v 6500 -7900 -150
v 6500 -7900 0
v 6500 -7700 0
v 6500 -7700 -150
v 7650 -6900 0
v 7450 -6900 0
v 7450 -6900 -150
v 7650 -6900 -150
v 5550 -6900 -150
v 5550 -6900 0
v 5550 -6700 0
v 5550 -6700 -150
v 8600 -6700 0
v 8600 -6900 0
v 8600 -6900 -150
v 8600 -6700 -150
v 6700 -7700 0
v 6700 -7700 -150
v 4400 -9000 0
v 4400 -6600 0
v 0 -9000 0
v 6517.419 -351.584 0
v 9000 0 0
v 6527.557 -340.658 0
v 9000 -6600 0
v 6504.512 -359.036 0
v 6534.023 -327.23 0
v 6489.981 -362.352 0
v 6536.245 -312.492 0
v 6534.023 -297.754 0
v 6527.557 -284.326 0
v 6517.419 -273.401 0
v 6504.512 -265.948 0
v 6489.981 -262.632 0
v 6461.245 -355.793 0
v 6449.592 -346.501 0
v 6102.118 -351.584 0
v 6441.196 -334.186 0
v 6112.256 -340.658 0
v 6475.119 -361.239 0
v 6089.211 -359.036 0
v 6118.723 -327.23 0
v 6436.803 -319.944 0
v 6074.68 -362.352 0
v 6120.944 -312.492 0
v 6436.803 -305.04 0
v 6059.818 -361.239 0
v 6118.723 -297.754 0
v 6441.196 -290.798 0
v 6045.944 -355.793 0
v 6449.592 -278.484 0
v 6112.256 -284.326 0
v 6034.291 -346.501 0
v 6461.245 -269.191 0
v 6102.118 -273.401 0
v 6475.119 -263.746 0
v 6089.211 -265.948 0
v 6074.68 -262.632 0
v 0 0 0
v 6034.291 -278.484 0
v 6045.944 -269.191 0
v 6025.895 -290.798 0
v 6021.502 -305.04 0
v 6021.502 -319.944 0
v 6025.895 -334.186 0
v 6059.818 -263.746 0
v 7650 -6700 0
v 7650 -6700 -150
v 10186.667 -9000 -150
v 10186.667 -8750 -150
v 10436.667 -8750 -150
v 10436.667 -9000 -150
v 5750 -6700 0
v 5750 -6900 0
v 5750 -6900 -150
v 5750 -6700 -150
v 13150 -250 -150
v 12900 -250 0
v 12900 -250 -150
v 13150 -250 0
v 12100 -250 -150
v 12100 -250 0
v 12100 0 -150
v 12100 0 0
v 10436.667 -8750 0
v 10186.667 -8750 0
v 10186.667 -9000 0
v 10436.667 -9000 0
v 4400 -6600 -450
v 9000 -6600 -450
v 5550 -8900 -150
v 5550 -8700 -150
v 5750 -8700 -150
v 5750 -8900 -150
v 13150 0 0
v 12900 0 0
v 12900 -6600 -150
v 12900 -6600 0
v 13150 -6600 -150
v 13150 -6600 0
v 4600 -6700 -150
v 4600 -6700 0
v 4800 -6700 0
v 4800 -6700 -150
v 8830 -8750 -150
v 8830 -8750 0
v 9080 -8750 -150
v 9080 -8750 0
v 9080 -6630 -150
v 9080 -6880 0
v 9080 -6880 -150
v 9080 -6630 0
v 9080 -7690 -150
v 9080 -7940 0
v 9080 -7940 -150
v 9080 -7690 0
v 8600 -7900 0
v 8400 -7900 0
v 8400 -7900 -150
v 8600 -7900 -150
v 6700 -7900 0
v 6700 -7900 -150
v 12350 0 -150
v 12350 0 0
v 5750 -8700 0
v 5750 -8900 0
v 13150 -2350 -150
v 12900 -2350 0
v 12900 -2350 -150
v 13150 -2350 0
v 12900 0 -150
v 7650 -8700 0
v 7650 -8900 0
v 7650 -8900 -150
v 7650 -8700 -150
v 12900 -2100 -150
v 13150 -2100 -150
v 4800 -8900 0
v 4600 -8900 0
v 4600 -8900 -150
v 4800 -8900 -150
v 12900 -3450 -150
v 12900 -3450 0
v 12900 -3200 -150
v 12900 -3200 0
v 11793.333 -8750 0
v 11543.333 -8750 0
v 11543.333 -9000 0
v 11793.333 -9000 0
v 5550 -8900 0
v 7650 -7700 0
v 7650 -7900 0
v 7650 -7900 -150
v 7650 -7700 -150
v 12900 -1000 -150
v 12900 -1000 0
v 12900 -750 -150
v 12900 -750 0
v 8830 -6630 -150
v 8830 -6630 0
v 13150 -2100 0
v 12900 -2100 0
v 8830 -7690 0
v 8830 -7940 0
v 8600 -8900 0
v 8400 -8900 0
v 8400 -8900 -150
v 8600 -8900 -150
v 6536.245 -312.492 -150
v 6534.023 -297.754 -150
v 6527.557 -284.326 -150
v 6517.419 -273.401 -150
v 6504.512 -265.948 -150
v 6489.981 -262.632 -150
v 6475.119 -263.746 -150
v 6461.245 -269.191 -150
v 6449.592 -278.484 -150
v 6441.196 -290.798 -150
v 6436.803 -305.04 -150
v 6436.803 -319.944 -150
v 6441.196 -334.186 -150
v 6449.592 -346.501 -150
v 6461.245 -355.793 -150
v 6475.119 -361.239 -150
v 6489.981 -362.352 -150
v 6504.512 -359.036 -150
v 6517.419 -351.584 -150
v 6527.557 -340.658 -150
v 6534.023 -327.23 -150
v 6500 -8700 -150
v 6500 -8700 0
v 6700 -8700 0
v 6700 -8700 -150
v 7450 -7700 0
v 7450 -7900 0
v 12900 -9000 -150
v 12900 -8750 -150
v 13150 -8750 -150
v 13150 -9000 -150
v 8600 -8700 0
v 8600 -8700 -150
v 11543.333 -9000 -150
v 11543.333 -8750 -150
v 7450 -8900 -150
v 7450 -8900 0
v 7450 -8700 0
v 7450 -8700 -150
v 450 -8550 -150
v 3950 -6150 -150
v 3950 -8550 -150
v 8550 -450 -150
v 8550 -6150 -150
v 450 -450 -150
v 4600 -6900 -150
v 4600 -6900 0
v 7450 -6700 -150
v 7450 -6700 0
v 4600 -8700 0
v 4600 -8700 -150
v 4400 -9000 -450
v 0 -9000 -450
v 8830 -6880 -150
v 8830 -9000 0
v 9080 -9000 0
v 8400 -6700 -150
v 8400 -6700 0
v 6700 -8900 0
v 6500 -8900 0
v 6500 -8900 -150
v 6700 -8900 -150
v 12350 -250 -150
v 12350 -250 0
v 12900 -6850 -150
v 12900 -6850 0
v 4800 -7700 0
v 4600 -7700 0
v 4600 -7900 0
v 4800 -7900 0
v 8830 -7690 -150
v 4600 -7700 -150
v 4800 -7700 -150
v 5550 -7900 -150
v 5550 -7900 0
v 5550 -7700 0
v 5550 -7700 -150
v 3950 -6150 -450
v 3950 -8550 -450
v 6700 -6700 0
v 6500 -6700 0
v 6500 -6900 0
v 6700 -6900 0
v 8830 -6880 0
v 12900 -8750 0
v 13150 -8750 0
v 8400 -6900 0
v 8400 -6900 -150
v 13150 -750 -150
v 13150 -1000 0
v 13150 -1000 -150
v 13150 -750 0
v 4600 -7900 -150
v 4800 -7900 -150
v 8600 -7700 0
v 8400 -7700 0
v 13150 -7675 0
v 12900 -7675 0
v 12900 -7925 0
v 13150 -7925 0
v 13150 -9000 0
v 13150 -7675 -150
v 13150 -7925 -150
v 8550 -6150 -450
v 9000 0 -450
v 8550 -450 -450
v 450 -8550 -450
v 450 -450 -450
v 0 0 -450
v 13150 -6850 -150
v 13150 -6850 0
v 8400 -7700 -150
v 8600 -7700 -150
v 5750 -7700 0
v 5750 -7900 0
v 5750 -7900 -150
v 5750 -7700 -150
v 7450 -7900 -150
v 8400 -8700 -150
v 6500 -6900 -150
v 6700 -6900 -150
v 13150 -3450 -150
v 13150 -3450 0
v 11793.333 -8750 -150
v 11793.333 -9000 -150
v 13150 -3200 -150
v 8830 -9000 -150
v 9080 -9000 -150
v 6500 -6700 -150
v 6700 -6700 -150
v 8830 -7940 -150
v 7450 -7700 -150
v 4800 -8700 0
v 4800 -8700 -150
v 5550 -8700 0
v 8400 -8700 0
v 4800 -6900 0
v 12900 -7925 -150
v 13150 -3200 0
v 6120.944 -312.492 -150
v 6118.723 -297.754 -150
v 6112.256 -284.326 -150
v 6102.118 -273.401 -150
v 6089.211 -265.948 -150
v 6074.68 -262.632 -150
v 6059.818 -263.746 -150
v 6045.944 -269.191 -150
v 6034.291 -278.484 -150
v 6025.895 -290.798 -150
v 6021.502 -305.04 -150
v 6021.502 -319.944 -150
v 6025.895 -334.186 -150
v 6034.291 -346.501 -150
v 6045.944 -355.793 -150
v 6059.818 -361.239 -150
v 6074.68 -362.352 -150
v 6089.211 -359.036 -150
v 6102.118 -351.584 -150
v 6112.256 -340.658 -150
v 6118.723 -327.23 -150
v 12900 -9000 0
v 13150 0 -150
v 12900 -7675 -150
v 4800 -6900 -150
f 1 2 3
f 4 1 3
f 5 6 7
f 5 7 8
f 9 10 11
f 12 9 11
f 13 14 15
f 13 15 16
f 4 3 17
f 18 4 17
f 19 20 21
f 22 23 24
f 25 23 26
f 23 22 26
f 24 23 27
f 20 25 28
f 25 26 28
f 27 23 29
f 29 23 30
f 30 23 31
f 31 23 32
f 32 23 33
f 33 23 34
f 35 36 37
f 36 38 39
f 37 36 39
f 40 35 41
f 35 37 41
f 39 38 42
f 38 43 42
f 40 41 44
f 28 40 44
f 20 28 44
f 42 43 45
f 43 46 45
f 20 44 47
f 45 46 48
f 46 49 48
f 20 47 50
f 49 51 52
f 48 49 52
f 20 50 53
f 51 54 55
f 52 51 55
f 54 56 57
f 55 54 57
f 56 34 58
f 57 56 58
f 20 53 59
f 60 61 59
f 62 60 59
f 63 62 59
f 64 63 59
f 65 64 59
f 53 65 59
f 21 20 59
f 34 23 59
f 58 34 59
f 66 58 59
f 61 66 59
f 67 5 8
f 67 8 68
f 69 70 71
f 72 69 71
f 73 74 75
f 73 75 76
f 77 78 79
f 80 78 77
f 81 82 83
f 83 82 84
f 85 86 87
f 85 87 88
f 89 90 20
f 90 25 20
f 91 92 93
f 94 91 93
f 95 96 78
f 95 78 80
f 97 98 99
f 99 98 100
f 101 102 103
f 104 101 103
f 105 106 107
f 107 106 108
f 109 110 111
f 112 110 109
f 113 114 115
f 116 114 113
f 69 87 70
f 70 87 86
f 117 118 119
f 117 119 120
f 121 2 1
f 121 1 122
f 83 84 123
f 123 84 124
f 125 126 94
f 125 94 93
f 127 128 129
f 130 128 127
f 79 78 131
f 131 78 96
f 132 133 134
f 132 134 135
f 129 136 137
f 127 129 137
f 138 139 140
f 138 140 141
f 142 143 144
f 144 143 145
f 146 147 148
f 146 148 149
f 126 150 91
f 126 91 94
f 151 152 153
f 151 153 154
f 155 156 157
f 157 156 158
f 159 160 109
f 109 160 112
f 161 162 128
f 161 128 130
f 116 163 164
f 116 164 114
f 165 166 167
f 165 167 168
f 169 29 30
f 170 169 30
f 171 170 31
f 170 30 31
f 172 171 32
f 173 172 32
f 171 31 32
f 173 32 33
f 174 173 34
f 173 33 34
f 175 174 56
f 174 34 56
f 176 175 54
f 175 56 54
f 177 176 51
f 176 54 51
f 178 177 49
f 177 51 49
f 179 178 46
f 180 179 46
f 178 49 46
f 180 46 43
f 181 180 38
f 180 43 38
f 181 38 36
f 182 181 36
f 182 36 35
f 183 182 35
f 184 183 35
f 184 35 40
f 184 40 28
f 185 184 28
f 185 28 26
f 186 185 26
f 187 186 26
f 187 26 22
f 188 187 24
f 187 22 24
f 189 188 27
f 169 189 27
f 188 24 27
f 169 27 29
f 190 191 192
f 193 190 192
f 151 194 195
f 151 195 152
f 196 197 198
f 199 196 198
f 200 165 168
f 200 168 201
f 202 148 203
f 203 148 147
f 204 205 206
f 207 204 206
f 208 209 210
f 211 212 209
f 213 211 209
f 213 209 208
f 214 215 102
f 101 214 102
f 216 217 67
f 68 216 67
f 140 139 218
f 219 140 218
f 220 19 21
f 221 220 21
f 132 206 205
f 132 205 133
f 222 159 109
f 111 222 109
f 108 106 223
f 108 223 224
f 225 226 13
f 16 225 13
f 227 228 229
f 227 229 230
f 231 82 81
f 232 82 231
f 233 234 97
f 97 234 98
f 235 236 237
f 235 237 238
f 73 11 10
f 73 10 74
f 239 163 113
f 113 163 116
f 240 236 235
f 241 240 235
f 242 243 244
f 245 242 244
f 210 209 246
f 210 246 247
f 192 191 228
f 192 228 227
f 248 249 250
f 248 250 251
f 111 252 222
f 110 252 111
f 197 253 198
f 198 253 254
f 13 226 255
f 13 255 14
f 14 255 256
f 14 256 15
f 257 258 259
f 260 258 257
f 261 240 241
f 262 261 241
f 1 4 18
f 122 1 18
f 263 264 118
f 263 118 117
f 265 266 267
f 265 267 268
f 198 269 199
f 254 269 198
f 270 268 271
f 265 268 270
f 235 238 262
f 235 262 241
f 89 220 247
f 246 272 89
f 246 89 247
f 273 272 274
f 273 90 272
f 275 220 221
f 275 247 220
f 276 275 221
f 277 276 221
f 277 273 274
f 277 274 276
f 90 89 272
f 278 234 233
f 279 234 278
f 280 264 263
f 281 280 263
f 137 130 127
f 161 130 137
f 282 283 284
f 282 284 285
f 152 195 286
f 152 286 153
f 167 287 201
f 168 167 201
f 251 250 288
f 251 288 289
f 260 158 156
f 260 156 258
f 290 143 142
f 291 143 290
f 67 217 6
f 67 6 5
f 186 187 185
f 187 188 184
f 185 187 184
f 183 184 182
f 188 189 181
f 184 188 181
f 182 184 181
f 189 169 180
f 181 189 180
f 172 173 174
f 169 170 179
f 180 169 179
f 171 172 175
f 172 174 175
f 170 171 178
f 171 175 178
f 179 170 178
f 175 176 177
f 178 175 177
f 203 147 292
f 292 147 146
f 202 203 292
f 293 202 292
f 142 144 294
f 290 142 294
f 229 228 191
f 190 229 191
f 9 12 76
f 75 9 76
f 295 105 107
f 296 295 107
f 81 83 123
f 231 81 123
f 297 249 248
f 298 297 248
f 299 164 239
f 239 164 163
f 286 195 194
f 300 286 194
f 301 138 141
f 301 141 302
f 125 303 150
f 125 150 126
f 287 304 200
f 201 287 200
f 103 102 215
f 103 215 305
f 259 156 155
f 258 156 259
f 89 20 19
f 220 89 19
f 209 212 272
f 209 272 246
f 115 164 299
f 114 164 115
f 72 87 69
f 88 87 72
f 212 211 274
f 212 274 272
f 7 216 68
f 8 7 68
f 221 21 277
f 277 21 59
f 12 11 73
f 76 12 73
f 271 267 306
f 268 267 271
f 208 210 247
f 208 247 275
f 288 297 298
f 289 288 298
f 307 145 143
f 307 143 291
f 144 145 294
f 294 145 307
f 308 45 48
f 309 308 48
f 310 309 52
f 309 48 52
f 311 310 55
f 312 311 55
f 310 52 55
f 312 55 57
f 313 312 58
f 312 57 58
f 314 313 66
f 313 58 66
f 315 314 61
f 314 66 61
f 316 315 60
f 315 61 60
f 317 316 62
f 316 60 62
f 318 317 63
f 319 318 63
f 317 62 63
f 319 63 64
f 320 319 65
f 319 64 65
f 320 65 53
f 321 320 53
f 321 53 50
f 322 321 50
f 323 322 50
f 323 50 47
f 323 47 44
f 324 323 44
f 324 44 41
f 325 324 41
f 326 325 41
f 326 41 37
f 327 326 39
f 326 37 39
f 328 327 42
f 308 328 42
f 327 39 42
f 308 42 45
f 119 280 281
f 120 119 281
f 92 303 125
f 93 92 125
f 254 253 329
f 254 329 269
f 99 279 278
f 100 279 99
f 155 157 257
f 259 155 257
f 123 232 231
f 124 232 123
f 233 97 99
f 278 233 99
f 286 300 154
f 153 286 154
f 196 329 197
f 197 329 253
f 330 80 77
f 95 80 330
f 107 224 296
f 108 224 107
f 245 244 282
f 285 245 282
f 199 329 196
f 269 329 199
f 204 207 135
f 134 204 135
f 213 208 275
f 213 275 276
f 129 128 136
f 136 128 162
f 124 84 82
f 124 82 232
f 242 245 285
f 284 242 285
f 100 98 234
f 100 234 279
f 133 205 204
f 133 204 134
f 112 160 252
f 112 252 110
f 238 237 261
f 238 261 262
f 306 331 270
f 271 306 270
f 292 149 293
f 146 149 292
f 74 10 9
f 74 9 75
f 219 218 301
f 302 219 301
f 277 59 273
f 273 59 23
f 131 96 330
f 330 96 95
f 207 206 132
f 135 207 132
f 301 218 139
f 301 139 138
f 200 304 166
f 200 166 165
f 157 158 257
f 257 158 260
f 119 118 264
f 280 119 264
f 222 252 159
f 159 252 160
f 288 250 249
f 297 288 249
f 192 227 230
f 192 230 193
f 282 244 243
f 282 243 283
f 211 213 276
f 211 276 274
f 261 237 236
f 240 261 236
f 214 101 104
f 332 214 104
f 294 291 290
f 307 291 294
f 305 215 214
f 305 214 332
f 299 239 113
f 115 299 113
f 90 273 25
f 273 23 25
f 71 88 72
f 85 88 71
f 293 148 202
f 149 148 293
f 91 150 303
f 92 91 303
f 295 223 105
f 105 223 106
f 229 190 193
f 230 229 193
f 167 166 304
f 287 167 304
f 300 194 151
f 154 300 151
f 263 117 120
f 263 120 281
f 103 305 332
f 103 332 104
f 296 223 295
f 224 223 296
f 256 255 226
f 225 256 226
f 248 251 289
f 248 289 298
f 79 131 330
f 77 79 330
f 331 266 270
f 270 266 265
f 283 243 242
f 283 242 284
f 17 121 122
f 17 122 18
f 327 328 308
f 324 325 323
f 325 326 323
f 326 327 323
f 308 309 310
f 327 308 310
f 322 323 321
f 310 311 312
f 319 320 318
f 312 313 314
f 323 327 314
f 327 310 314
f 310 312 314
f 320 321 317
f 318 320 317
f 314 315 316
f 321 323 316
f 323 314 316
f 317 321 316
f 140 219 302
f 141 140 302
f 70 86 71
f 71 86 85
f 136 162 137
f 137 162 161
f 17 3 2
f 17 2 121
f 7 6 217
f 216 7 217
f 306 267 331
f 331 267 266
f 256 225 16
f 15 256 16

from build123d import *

# Parameters (mm, degrees)
SKETCH_1_R         = 50
EXTRUDE_1_DEPTH    = 150
SKETCH_1_W         = 250
SKETCH_1_H         = 250
EXTRUDE_1_2_DEPTH  = 150
EXTRUDE_1_3_DEPTH  = 150
EXTRUDE_1_4_DEPTH  = 150
EXTRUDE_1_5_DEPTH  = 150
EXTRUDE_1_6_DEPTH  = 150
EXTRUDE_1_7_DEPTH  = 150
EXTRUDE_1_8_DEPTH  = 150
EXTRUDE_1_9_DEPTH  = 150
EXTRUDE_1_10_DEPTH = 150
EXTRUDE_1_11_DEPTH = 150
EXTRUDE_1_12_DEPTH = 150
EXTRUDE_1_13_DEPTH = 150
EXTRUDE_1_14_DEPTH = 150
SKETCH_1_W_2       = 200
SKETCH_1_H_2       = 200
EXTRUDE_1_15_DEPTH = 150
EXTRUDE_1_16_DEPTH = 150
EXTRUDE_1_17_DEPTH = 150
EXTRUDE_1_18_DEPTH = 150
EXTRUDE_1_19_DEPTH = 150
EXTRUDE_1_20_DEPTH = 150
EXTRUDE_1_21_DEPTH = 150
EXTRUDE_1_22_DEPTH = 150
EXTRUDE_1_23_DEPTH = 150
EXTRUDE_1_24_DEPTH = 150
EXTRUDE_1_25_DEPTH = 150
EXTRUDE_1_26_DEPTH = 150
EXTRUDE_1_27_DEPTH = 150
EXTRUDE_1_28_DEPTH = 150
EXTRUDE_1_29_DEPTH = 150
EXTRUDE_2_DEPTH    = 300


with BuildPart() as part:
    # Эскиз1 → Бобышка-Вытянуть1 (new body)
    with BuildSketch(Plane.XY):
        Polygon((0, 0), (9000, 0), (9000, -6600), (4400, -6600), (4400, -9000), (0, -9000), align=None)
        with Locations((6486.244831881, -312.492160742)):
            Circle(SKETCH_1_R, mode=Mode.SUBTRACT)
        with Locations((6070.943926101, -312.492160742)):
            Circle(SKETCH_1_R, mode=Mode.SUBTRACT)
    extrude(amount=-EXTRUDE_1_DEPTH)

    # Эскиз2 → Бобышка-Вытянуть2 (add)
    with BuildSketch(Plane(origin=(0, 0, -150), x_dir=(-1, 0, 0), z_dir=(0, 0, -1))):
        Polygon((0, -9000), (0, 0), (-9000, 0), (-9000, -6600), (-4400, -6600), (-4400, -9000), align=None)
        Polygon((-450, -8550), (-450, -450), (-8550, -450), (-8550, -6150), (-3950, -6150), (-3950, -8550), align=None, mode=Mode.SUBTRACT)
    extrude(amount=EXTRUDE_2_DEPTH)


with BuildPart() as body_2:
    # Эскиз1 → Extrude 1 2 (new body)
    with BuildSketch(Plane.XY):
        with Locations((8955, -8875)):
            Rectangle(SKETCH_1_W, SKETCH_1_H)
    extrude(amount=-EXTRUDE_1_2_DEPTH)


with BuildPart() as body_3:
    # Эскиз1 → Extrude 1 3 (new body)
    with BuildSketch(Plane.XY):
        with Locations((8955, -6755)):
            Rectangle(SKETCH_1_W, SKETCH_1_H)
    extrude(amount=-EXTRUDE_1_3_DEPTH)


with BuildPart() as body_4:
    # Эскиз1 → Extrude 1 4 (new body)
    with BuildSketch(Plane.XY):
        with Locations((8955, -7815)):
            Rectangle(SKETCH_1_W, SKETCH_1_H)
    extrude(amount=-EXTRUDE_1_4_DEPTH)


with BuildPart() as body_5:
    # Эскиз1 → Extrude 1 5 (new body)
    with BuildSketch(Plane.XY):
        with Locations((10311.666666667, -8875)):
            Rectangle(SKETCH_1_W, SKETCH_1_H)
    extrude(amount=-EXTRUDE_1_5_DEPTH)


with BuildPart() as body_6:
    # Эскиз1 → Extrude 1 6 (new body)
    with BuildSketch(Plane.XY):
        with Locations((11668.333333333, -8875)):
            Rectangle(SKETCH_1_W, SKETCH_1_H)
    extrude(amount=-EXTRUDE_1_6_DEPTH)


with BuildPart() as body_7:
    # Эскиз1 → Extrude 1 7 (new body)
    with BuildSketch(Plane.XY):
        with Locations((13025, -8875)):
            Rectangle(SKETCH_1_W, SKETCH_1_H)
    extrude(amount=-EXTRUDE_1_7_DEPTH)


with BuildPart() as body_8:
    # Эскиз1 → Extrude 1 8 (new body)
    with BuildSketch(Plane.XY):
        with Locations((13025, -6725)):
            Rectangle(SKETCH_1_W, SKETCH_1_H)
    extrude(amount=-EXTRUDE_1_8_DEPTH)


with BuildPart() as body_9:
    # Эскиз1 → Extrude 1 9 (new body)
    with BuildSketch(Plane.XY):
        with Locations((13025, -7800)):
            Rectangle(SKETCH_1_W, SKETCH_1_H)
    extrude(amount=-EXTRUDE_1_9_DEPTH)


with BuildPart() as body_10:
    # Эскиз1 → Extrude 1 10 (new body)
    with BuildSketch(Plane.XY):
        with Locations((13025, -3325)):
            Rectangle(SKETCH_1_W, SKETCH_1_H)
    extrude(amount=-EXTRUDE_1_10_DEPTH)


with BuildPart() as body_11:
    # Эскиз1 → Extrude 1 11 (new body)
    with BuildSketch(Plane.XY):
        with Locations((13025, -2225)):
            Rectangle(SKETCH_1_W, SKETCH_1_H)
    extrude(amount=-EXTRUDE_1_11_DEPTH)


with BuildPart() as body_12:
    # Эскиз1 → Extrude 1 12 (new body)
    with BuildSketch(Plane.XY):
        with Locations((13025, -875)):
            Rectangle(SKETCH_1_W, SKETCH_1_H)
    extrude(amount=-EXTRUDE_1_12_DEPTH)


with BuildPart() as body_13:
    # Эскиз1 → Extrude 1 13 (new body)
    with BuildSketch(Plane.XY):
        with Locations((13025, -125)):
            Rectangle(SKETCH_1_W, SKETCH_1_H)
    extrude(amount=-EXTRUDE_1_13_DEPTH)


with BuildPart() as body_14:
    # Эскиз1 → Extrude 1 14 (new body)
    with BuildSketch(Plane.XY):
        with Locations((12225, -125)):
            Rectangle(SKETCH_1_W, SKETCH_1_H)
    extrude(amount=-EXTRUDE_1_14_DEPTH)


with BuildPart() as body_15:
    # Эскиз1 → Extrude 1 15 (new body)
    with BuildSketch(Plane.XY):
        with Locations((4700, -6800)):
            Rectangle(SKETCH_1_W_2, SKETCH_1_H_2)
    extrude(amount=-EXTRUDE_1_15_DEPTH)


with BuildPart() as body_16:
    # Эскиз1 → Extrude 1 16 (new body)
    with BuildSketch(Plane.XY):
        with Locations((4700, -7800)):
            Rectangle(SKETCH_1_W_2, SKETCH_1_H_2)
    extrude(amount=-EXTRUDE_1_16_DEPTH)


with BuildPart() as body_17:
    # Эскиз1 → Extrude 1 17 (new body)
    with BuildSketch(Plane.XY):
        with Locations((4700, -8800)):
            Rectangle(SKETCH_1_W_2, SKETCH_1_H_2)
    extrude(amount=-EXTRUDE_1_17_DEPTH)


with BuildPart() as body_18:
    # Эскиз1 → Extrude 1 18 (new body)
    with BuildSketch(Plane.XY):
        with Locations((5650, -6800)):
            Rectangle(SKETCH_1_W_2, SKETCH_1_H_2)
    extrude(amount=-EXTRUDE_1_18_DEPTH)


with BuildPart() as body_19:
    # Эскиз1 → Extrude 1 19 (new body)
    with BuildSketch(Plane.XY):
        with Locations((5650, -7800)):
            Rectangle(SKETCH_1_W_2, SKETCH_1_H_2)
    extrude(amount=-EXTRUDE_1_19_DEPTH)


with BuildPart() as body_20:
    # Эскиз1 → Extrude 1 20 (new body)
    with BuildSketch(Plane.XY):
        with Locations((5650, -8800)):
            Rectangle(SKETCH_1_W_2, SKETCH_1_H_2)
    extrude(amount=-EXTRUDE_1_20_DEPTH)


with BuildPart() as body_21:
    # Эскиз1 → Extrude 1 21 (new body)
    with BuildSketch(Plane.XY):
        with Locations((6600, -6800)):
            Rectangle(SKETCH_1_W_2, SKETCH_1_H_2)
    extrude(amount=-EXTRUDE_1_21_DEPTH)


with BuildPart() as body_22:
    # Эскиз1 → Extrude 1 22 (new body)
    with BuildSketch(Plane.XY):
        with Locations((6600, -7800)):
            Rectangle(SKETCH_1_W_2, SKETCH_1_H_2)
    extrude(amount=-EXTRUDE_1_22_DEPTH)


with BuildPart() as body_23:
    # Эскиз1 → Extrude 1 23 (new body)
    with BuildSketch(Plane.XY):
        with Locations((6600, -8800)):
            Rectangle(SKETCH_1_W_2, SKETCH_1_H_2)
    extrude(amount=-EXTRUDE_1_23_DEPTH)


with BuildPart() as body_24:
    # Эскиз1 → Extrude 1 24 (new body)
    with BuildSketch(Plane.XY):
        with Locations((7550, -6800)):
            Rectangle(SKETCH_1_W_2, SKETCH_1_H_2)
    extrude(amount=-EXTRUDE_1_24_DEPTH)


with BuildPart() as body_25:
    # Эскиз1 → Extrude 1 25 (new body)
    with BuildSketch(Plane.XY):
        with Locations((7550, -7800)):
            Rectangle(SKETCH_1_W_2, SKETCH_1_H_2)
    extrude(amount=-EXTRUDE_1_25_DEPTH)


with BuildPart() as body_26:
    # Эскиз1 → Extrude 1 26 (new body)
    with BuildSketch(Plane.XY):
        with Locations((7550, -8800)):
            Rectangle(SKETCH_1_W_2, SKETCH_1_H_2)
    extrude(amount=-EXTRUDE_1_26_DEPTH)


with BuildPart() as body_27:
    # Эскиз1 → Extrude 1 27 (new body)
    with BuildSketch(Plane.XY):
        with Locations((8500, -6800)):
            Rectangle(SKETCH_1_W_2, SKETCH_1_H_2)
    extrude(amount=-EXTRUDE_1_27_DEPTH)


with BuildPart() as body_28:
    # Эскиз1 → Extrude 1 28 (new body)
    with BuildSketch(Plane.XY):
        with Locations((8500, -7800)):
            Rectangle(SKETCH_1_W_2, SKETCH_1_H_2)
    extrude(amount=-EXTRUDE_1_28_DEPTH)


with BuildPart() as body_29:
    # Эскиз1 → Extrude 1 29 (new body)
    with BuildSketch(Plane.XY):
        with Locations((8500, -8800)):
            Rectangle(SKETCH_1_W_2, SKETCH_1_H_2)
    extrude(amount=-EXTRUDE_1_29_DEPTH)


solid = Compound([part.part, body_2.part, body_3.part, body_4.part, body_5.part, body_6.part, body_7.part, body_8.part, body_9.part, body_10.part, body_11.part, body_12.part, body_13.part, body_14.part, body_15.part, body_16.part, body_17.part, body_18.part, body_19.part, body_20.part, body_21.part, body_22.part, body_23.part, body_24.part, body_25.part, body_26.part, body_27.part, body_28.part, body_29.part])
